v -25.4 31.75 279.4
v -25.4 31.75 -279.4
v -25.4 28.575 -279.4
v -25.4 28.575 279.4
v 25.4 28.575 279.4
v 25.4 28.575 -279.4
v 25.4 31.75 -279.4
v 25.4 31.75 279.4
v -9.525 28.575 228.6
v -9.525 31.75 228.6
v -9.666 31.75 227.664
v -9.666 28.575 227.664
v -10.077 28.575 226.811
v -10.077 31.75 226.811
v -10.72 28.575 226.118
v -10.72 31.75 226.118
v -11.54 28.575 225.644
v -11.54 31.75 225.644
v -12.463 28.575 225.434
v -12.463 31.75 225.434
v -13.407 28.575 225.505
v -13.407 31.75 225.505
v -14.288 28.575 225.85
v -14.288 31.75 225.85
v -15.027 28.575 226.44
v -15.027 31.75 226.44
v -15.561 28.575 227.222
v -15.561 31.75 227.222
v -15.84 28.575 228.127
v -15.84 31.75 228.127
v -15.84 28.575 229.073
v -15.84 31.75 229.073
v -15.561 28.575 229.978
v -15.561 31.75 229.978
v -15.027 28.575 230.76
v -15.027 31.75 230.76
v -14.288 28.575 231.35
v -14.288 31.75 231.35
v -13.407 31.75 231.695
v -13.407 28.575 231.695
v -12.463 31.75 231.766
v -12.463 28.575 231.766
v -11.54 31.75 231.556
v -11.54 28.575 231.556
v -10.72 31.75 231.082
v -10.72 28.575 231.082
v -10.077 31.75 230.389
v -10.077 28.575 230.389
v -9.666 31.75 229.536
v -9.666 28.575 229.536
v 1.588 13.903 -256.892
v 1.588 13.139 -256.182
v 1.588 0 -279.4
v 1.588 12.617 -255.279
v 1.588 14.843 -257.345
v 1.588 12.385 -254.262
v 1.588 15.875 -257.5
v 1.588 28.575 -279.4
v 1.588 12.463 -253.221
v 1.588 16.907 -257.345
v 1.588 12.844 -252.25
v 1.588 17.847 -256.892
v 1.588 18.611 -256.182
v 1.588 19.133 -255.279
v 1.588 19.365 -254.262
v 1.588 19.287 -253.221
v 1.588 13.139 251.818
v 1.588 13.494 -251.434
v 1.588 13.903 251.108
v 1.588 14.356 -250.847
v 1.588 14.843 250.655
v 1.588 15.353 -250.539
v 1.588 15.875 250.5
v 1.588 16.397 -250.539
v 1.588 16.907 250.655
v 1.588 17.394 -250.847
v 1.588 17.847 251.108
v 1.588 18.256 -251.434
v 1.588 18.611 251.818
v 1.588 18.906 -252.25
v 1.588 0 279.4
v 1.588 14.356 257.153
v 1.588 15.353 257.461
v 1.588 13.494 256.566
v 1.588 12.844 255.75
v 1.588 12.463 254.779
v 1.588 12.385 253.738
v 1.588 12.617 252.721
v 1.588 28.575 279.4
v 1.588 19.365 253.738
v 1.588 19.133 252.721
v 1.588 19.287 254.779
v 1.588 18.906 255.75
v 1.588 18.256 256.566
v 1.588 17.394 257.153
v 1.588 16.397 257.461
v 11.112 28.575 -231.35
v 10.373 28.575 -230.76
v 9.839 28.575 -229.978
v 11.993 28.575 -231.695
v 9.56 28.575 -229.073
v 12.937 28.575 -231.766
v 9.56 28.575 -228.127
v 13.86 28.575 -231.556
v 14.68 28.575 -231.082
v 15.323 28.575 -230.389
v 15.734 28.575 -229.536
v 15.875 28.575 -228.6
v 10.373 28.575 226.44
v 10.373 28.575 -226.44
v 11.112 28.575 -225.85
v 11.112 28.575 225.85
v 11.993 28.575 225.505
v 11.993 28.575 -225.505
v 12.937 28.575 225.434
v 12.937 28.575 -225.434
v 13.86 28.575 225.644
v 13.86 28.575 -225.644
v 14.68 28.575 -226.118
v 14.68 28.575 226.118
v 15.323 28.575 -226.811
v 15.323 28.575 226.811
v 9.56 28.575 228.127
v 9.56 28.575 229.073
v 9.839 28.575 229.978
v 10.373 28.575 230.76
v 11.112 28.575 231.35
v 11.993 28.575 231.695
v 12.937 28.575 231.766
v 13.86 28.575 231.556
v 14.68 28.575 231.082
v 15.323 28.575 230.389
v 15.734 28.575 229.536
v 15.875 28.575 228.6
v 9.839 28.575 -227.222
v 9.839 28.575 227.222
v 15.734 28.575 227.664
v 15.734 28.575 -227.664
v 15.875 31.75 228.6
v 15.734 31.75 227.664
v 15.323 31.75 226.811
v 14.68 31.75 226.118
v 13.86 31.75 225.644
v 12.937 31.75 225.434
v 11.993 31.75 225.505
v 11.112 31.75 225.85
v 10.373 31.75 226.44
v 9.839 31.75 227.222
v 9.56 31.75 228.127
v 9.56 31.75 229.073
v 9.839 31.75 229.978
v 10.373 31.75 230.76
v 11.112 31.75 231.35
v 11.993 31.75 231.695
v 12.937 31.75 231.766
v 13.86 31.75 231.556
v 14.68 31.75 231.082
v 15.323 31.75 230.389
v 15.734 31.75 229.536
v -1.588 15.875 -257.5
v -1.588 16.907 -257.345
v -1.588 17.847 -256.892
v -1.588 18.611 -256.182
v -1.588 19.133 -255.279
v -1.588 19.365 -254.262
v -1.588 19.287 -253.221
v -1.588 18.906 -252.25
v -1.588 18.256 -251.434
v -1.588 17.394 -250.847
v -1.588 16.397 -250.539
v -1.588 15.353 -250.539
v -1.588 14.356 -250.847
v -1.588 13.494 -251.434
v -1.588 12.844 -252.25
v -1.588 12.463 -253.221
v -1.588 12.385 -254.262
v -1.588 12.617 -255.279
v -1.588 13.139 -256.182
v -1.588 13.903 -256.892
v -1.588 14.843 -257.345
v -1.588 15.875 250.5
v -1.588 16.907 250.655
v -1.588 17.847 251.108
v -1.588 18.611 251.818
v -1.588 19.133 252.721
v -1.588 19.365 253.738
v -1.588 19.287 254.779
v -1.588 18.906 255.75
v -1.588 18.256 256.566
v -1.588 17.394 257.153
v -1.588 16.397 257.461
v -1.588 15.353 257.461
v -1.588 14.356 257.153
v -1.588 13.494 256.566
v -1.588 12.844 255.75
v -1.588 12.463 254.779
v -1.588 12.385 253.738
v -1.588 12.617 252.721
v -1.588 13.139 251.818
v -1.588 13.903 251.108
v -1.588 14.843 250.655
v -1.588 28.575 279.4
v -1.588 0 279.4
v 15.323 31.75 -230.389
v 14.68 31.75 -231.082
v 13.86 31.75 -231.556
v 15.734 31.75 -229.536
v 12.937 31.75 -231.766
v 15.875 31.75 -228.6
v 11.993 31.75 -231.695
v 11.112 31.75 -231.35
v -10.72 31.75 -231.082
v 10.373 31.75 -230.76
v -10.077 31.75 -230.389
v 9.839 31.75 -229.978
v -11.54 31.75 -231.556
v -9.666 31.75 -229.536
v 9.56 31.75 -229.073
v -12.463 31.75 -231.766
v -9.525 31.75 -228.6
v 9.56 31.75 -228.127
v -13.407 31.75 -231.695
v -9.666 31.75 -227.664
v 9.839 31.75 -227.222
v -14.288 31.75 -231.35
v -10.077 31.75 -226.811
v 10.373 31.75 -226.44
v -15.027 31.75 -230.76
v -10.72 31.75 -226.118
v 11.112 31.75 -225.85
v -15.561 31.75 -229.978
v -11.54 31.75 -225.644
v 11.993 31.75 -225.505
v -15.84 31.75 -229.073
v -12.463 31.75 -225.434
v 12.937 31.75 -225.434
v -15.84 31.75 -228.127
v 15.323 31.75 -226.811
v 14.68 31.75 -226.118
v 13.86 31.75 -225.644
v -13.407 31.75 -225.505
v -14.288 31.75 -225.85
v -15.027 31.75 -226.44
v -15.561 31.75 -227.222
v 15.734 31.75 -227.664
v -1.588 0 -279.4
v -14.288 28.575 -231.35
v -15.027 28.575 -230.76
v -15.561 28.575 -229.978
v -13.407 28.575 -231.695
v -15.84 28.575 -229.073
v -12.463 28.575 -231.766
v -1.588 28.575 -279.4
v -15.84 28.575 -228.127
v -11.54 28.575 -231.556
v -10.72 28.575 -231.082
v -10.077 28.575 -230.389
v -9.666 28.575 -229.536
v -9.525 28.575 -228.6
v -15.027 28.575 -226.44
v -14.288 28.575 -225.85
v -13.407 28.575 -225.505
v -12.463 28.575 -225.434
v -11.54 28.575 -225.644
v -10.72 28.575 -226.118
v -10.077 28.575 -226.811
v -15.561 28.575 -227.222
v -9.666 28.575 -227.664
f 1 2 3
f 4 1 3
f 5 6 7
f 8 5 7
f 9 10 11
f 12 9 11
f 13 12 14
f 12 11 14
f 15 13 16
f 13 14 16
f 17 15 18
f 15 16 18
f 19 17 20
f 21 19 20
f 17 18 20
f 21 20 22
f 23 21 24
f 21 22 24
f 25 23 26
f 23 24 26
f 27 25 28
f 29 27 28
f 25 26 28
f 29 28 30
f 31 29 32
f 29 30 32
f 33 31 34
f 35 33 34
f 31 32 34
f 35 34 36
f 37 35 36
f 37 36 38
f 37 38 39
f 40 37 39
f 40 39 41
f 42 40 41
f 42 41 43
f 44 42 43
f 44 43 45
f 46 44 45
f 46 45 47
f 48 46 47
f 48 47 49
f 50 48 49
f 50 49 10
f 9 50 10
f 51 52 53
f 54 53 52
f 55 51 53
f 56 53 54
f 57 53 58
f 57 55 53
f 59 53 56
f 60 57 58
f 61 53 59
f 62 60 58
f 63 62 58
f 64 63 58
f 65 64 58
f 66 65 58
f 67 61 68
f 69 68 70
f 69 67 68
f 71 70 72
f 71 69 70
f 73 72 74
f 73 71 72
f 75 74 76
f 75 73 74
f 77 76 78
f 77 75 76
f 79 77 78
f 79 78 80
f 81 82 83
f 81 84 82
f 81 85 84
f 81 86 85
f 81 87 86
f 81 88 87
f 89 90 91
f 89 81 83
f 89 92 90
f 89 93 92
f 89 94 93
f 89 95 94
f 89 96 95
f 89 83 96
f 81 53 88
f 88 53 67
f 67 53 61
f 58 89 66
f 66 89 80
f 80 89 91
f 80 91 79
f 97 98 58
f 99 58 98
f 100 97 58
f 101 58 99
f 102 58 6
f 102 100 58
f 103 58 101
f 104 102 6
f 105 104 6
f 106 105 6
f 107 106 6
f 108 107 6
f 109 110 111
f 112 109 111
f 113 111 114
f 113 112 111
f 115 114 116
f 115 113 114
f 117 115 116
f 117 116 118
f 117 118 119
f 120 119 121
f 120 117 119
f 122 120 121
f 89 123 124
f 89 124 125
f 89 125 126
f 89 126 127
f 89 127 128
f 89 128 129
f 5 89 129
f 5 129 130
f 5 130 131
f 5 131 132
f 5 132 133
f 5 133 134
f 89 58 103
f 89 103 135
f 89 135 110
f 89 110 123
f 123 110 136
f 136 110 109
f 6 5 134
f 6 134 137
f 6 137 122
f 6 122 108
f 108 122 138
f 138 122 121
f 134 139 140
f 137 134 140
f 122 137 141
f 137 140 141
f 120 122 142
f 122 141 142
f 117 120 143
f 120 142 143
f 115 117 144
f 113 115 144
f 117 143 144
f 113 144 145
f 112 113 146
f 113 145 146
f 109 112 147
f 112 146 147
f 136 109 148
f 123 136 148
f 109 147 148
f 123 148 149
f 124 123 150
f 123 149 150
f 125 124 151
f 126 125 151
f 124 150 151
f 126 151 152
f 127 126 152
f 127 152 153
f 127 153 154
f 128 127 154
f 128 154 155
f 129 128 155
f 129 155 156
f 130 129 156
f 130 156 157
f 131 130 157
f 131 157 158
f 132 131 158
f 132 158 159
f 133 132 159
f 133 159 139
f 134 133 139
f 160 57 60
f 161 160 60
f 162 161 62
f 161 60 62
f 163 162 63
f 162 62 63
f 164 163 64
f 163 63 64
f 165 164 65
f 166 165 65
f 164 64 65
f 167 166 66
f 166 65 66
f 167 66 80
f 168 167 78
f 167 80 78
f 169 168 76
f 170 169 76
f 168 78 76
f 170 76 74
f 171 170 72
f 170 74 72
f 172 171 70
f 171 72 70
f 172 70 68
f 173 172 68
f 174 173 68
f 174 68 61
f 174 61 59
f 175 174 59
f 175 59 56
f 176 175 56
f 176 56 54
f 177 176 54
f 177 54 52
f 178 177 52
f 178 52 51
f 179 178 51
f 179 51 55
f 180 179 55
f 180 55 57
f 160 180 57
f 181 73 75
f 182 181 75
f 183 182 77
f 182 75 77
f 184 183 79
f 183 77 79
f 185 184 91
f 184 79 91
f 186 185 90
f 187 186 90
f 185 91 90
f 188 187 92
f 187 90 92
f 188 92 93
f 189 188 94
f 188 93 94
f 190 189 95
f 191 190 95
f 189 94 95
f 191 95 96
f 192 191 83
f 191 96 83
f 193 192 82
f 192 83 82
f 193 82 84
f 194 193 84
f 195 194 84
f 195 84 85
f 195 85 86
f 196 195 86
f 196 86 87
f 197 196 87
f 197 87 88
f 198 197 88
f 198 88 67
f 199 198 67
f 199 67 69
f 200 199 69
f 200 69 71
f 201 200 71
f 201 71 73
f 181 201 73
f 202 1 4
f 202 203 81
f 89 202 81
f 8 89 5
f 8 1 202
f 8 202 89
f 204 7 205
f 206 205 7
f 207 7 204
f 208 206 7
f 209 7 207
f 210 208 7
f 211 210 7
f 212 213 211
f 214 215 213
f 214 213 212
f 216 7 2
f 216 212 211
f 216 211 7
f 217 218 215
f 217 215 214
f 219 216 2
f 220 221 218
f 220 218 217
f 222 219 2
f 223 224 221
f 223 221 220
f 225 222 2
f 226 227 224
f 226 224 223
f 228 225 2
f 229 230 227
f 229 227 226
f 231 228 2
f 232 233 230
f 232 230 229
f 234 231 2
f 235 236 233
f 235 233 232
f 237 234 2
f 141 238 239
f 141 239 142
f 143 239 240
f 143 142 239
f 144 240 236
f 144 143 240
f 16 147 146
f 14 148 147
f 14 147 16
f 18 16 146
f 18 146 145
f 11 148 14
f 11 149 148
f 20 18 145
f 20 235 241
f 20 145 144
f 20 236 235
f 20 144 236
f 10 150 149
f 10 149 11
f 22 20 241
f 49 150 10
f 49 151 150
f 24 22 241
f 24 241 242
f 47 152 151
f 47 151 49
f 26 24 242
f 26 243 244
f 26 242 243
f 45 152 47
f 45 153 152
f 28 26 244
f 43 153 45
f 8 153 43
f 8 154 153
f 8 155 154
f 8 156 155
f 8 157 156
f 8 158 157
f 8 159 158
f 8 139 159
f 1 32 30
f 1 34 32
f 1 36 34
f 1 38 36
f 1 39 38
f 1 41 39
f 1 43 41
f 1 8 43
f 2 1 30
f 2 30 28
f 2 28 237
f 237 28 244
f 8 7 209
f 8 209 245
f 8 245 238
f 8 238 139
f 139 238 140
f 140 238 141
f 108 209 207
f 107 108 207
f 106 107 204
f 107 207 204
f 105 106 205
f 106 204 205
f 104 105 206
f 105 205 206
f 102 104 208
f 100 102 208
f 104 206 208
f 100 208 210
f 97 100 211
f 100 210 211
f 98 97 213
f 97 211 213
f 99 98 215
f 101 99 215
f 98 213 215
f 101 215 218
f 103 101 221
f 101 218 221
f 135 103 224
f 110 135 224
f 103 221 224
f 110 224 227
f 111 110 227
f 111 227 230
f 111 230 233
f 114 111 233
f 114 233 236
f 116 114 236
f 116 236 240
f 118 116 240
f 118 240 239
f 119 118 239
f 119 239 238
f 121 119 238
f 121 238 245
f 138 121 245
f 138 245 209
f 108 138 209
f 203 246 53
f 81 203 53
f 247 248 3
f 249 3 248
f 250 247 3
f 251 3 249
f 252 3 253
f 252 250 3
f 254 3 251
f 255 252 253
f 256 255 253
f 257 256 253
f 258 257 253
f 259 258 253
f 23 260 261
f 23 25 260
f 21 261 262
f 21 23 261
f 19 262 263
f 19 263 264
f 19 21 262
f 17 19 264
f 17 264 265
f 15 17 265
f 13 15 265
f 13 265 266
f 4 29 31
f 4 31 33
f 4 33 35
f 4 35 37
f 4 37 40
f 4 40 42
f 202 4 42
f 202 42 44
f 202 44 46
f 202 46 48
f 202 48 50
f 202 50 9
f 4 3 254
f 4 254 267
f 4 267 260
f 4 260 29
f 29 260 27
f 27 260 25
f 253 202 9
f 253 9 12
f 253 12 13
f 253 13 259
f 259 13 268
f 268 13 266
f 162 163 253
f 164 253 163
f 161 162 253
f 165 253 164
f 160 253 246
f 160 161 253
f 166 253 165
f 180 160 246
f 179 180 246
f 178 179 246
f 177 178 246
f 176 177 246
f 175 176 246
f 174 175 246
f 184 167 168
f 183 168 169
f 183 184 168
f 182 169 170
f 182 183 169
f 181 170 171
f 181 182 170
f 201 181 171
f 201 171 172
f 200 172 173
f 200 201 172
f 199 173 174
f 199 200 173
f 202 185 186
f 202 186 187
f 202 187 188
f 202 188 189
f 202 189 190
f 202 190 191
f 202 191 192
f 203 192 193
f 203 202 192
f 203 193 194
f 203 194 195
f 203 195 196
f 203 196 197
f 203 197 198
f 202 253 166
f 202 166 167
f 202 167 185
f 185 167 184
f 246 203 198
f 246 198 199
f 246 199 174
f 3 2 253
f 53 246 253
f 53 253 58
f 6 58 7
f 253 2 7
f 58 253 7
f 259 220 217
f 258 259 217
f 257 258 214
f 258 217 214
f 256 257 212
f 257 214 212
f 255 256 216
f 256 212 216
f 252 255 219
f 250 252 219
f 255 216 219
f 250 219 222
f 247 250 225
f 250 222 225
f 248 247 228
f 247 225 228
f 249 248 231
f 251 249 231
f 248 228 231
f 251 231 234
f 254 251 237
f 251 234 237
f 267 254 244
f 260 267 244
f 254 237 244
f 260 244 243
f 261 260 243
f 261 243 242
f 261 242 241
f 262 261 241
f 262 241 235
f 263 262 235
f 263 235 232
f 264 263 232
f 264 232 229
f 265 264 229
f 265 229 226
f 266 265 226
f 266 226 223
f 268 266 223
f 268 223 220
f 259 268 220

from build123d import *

# Parameters (mm, degrees)
BOSS_EXTRUDE1_DEPTH = 279.4
SKETCH2_R           = 3.5
CUT_EXTRUDE1_DEPTH  = 27.9875
SKETCH3_R           = 3.175
CUT_EXTRUDE2_DEPTH  = 32.75


with BuildPart() as part:
    # Sketch1 → Boss-Extrude1 (new body, symmetric)
    with BuildSketch(Plane.XY):
        Polygon((-25.4, 31.75), (-25.4, 28.575), (-1.5875, 28.575), (-1.5875, 0), (1.5875, 0), (1.5875, 28.575), (25.4, 28.575), (25.4, 31.75), align=None)
    extrude(amount=BOSS_EXTRUDE1_DEPTH, both=True)

    # Sketch2 → Cut-Extrude1 (cut, through all)
    with BuildSketch(Plane(origin=(1.5875, 0, 0), x_dir=(0, 0, -1), z_dir=(1, 0, 0))):
        with Locations((-254, 15.875)):
            Circle(SKETCH2_R)
        with Locations((254, 15.875)):
            Circle(SKETCH2_R)
    extrude(amount=-CUT_EXTRUDE1_DEPTH, mode=Mode.SUBTRACT)

    # Sketch3 → Cut-Extrude2 (cut, through all)
    with BuildSketch(Plane(origin=(0, 31.75, 0), x_dir=(1, 0, 0), z_dir=(0, 1, 0))):
        with Locations((-12.7, 228.6)):
            Circle(SKETCH3_R)
        with Locations((12.7, 228.6)):
            Circle(SKETCH3_R)
        with Locations((12.7, -228.6)):
            Circle(SKETCH3_R)
        with Locations((-12.7, -228.6)):
            Circle(SKETCH3_R)
    extrude(amount=-CUT_EXTRUDE2_DEPTH, mode=Mode.SUBTRACT)


solid = part.part
